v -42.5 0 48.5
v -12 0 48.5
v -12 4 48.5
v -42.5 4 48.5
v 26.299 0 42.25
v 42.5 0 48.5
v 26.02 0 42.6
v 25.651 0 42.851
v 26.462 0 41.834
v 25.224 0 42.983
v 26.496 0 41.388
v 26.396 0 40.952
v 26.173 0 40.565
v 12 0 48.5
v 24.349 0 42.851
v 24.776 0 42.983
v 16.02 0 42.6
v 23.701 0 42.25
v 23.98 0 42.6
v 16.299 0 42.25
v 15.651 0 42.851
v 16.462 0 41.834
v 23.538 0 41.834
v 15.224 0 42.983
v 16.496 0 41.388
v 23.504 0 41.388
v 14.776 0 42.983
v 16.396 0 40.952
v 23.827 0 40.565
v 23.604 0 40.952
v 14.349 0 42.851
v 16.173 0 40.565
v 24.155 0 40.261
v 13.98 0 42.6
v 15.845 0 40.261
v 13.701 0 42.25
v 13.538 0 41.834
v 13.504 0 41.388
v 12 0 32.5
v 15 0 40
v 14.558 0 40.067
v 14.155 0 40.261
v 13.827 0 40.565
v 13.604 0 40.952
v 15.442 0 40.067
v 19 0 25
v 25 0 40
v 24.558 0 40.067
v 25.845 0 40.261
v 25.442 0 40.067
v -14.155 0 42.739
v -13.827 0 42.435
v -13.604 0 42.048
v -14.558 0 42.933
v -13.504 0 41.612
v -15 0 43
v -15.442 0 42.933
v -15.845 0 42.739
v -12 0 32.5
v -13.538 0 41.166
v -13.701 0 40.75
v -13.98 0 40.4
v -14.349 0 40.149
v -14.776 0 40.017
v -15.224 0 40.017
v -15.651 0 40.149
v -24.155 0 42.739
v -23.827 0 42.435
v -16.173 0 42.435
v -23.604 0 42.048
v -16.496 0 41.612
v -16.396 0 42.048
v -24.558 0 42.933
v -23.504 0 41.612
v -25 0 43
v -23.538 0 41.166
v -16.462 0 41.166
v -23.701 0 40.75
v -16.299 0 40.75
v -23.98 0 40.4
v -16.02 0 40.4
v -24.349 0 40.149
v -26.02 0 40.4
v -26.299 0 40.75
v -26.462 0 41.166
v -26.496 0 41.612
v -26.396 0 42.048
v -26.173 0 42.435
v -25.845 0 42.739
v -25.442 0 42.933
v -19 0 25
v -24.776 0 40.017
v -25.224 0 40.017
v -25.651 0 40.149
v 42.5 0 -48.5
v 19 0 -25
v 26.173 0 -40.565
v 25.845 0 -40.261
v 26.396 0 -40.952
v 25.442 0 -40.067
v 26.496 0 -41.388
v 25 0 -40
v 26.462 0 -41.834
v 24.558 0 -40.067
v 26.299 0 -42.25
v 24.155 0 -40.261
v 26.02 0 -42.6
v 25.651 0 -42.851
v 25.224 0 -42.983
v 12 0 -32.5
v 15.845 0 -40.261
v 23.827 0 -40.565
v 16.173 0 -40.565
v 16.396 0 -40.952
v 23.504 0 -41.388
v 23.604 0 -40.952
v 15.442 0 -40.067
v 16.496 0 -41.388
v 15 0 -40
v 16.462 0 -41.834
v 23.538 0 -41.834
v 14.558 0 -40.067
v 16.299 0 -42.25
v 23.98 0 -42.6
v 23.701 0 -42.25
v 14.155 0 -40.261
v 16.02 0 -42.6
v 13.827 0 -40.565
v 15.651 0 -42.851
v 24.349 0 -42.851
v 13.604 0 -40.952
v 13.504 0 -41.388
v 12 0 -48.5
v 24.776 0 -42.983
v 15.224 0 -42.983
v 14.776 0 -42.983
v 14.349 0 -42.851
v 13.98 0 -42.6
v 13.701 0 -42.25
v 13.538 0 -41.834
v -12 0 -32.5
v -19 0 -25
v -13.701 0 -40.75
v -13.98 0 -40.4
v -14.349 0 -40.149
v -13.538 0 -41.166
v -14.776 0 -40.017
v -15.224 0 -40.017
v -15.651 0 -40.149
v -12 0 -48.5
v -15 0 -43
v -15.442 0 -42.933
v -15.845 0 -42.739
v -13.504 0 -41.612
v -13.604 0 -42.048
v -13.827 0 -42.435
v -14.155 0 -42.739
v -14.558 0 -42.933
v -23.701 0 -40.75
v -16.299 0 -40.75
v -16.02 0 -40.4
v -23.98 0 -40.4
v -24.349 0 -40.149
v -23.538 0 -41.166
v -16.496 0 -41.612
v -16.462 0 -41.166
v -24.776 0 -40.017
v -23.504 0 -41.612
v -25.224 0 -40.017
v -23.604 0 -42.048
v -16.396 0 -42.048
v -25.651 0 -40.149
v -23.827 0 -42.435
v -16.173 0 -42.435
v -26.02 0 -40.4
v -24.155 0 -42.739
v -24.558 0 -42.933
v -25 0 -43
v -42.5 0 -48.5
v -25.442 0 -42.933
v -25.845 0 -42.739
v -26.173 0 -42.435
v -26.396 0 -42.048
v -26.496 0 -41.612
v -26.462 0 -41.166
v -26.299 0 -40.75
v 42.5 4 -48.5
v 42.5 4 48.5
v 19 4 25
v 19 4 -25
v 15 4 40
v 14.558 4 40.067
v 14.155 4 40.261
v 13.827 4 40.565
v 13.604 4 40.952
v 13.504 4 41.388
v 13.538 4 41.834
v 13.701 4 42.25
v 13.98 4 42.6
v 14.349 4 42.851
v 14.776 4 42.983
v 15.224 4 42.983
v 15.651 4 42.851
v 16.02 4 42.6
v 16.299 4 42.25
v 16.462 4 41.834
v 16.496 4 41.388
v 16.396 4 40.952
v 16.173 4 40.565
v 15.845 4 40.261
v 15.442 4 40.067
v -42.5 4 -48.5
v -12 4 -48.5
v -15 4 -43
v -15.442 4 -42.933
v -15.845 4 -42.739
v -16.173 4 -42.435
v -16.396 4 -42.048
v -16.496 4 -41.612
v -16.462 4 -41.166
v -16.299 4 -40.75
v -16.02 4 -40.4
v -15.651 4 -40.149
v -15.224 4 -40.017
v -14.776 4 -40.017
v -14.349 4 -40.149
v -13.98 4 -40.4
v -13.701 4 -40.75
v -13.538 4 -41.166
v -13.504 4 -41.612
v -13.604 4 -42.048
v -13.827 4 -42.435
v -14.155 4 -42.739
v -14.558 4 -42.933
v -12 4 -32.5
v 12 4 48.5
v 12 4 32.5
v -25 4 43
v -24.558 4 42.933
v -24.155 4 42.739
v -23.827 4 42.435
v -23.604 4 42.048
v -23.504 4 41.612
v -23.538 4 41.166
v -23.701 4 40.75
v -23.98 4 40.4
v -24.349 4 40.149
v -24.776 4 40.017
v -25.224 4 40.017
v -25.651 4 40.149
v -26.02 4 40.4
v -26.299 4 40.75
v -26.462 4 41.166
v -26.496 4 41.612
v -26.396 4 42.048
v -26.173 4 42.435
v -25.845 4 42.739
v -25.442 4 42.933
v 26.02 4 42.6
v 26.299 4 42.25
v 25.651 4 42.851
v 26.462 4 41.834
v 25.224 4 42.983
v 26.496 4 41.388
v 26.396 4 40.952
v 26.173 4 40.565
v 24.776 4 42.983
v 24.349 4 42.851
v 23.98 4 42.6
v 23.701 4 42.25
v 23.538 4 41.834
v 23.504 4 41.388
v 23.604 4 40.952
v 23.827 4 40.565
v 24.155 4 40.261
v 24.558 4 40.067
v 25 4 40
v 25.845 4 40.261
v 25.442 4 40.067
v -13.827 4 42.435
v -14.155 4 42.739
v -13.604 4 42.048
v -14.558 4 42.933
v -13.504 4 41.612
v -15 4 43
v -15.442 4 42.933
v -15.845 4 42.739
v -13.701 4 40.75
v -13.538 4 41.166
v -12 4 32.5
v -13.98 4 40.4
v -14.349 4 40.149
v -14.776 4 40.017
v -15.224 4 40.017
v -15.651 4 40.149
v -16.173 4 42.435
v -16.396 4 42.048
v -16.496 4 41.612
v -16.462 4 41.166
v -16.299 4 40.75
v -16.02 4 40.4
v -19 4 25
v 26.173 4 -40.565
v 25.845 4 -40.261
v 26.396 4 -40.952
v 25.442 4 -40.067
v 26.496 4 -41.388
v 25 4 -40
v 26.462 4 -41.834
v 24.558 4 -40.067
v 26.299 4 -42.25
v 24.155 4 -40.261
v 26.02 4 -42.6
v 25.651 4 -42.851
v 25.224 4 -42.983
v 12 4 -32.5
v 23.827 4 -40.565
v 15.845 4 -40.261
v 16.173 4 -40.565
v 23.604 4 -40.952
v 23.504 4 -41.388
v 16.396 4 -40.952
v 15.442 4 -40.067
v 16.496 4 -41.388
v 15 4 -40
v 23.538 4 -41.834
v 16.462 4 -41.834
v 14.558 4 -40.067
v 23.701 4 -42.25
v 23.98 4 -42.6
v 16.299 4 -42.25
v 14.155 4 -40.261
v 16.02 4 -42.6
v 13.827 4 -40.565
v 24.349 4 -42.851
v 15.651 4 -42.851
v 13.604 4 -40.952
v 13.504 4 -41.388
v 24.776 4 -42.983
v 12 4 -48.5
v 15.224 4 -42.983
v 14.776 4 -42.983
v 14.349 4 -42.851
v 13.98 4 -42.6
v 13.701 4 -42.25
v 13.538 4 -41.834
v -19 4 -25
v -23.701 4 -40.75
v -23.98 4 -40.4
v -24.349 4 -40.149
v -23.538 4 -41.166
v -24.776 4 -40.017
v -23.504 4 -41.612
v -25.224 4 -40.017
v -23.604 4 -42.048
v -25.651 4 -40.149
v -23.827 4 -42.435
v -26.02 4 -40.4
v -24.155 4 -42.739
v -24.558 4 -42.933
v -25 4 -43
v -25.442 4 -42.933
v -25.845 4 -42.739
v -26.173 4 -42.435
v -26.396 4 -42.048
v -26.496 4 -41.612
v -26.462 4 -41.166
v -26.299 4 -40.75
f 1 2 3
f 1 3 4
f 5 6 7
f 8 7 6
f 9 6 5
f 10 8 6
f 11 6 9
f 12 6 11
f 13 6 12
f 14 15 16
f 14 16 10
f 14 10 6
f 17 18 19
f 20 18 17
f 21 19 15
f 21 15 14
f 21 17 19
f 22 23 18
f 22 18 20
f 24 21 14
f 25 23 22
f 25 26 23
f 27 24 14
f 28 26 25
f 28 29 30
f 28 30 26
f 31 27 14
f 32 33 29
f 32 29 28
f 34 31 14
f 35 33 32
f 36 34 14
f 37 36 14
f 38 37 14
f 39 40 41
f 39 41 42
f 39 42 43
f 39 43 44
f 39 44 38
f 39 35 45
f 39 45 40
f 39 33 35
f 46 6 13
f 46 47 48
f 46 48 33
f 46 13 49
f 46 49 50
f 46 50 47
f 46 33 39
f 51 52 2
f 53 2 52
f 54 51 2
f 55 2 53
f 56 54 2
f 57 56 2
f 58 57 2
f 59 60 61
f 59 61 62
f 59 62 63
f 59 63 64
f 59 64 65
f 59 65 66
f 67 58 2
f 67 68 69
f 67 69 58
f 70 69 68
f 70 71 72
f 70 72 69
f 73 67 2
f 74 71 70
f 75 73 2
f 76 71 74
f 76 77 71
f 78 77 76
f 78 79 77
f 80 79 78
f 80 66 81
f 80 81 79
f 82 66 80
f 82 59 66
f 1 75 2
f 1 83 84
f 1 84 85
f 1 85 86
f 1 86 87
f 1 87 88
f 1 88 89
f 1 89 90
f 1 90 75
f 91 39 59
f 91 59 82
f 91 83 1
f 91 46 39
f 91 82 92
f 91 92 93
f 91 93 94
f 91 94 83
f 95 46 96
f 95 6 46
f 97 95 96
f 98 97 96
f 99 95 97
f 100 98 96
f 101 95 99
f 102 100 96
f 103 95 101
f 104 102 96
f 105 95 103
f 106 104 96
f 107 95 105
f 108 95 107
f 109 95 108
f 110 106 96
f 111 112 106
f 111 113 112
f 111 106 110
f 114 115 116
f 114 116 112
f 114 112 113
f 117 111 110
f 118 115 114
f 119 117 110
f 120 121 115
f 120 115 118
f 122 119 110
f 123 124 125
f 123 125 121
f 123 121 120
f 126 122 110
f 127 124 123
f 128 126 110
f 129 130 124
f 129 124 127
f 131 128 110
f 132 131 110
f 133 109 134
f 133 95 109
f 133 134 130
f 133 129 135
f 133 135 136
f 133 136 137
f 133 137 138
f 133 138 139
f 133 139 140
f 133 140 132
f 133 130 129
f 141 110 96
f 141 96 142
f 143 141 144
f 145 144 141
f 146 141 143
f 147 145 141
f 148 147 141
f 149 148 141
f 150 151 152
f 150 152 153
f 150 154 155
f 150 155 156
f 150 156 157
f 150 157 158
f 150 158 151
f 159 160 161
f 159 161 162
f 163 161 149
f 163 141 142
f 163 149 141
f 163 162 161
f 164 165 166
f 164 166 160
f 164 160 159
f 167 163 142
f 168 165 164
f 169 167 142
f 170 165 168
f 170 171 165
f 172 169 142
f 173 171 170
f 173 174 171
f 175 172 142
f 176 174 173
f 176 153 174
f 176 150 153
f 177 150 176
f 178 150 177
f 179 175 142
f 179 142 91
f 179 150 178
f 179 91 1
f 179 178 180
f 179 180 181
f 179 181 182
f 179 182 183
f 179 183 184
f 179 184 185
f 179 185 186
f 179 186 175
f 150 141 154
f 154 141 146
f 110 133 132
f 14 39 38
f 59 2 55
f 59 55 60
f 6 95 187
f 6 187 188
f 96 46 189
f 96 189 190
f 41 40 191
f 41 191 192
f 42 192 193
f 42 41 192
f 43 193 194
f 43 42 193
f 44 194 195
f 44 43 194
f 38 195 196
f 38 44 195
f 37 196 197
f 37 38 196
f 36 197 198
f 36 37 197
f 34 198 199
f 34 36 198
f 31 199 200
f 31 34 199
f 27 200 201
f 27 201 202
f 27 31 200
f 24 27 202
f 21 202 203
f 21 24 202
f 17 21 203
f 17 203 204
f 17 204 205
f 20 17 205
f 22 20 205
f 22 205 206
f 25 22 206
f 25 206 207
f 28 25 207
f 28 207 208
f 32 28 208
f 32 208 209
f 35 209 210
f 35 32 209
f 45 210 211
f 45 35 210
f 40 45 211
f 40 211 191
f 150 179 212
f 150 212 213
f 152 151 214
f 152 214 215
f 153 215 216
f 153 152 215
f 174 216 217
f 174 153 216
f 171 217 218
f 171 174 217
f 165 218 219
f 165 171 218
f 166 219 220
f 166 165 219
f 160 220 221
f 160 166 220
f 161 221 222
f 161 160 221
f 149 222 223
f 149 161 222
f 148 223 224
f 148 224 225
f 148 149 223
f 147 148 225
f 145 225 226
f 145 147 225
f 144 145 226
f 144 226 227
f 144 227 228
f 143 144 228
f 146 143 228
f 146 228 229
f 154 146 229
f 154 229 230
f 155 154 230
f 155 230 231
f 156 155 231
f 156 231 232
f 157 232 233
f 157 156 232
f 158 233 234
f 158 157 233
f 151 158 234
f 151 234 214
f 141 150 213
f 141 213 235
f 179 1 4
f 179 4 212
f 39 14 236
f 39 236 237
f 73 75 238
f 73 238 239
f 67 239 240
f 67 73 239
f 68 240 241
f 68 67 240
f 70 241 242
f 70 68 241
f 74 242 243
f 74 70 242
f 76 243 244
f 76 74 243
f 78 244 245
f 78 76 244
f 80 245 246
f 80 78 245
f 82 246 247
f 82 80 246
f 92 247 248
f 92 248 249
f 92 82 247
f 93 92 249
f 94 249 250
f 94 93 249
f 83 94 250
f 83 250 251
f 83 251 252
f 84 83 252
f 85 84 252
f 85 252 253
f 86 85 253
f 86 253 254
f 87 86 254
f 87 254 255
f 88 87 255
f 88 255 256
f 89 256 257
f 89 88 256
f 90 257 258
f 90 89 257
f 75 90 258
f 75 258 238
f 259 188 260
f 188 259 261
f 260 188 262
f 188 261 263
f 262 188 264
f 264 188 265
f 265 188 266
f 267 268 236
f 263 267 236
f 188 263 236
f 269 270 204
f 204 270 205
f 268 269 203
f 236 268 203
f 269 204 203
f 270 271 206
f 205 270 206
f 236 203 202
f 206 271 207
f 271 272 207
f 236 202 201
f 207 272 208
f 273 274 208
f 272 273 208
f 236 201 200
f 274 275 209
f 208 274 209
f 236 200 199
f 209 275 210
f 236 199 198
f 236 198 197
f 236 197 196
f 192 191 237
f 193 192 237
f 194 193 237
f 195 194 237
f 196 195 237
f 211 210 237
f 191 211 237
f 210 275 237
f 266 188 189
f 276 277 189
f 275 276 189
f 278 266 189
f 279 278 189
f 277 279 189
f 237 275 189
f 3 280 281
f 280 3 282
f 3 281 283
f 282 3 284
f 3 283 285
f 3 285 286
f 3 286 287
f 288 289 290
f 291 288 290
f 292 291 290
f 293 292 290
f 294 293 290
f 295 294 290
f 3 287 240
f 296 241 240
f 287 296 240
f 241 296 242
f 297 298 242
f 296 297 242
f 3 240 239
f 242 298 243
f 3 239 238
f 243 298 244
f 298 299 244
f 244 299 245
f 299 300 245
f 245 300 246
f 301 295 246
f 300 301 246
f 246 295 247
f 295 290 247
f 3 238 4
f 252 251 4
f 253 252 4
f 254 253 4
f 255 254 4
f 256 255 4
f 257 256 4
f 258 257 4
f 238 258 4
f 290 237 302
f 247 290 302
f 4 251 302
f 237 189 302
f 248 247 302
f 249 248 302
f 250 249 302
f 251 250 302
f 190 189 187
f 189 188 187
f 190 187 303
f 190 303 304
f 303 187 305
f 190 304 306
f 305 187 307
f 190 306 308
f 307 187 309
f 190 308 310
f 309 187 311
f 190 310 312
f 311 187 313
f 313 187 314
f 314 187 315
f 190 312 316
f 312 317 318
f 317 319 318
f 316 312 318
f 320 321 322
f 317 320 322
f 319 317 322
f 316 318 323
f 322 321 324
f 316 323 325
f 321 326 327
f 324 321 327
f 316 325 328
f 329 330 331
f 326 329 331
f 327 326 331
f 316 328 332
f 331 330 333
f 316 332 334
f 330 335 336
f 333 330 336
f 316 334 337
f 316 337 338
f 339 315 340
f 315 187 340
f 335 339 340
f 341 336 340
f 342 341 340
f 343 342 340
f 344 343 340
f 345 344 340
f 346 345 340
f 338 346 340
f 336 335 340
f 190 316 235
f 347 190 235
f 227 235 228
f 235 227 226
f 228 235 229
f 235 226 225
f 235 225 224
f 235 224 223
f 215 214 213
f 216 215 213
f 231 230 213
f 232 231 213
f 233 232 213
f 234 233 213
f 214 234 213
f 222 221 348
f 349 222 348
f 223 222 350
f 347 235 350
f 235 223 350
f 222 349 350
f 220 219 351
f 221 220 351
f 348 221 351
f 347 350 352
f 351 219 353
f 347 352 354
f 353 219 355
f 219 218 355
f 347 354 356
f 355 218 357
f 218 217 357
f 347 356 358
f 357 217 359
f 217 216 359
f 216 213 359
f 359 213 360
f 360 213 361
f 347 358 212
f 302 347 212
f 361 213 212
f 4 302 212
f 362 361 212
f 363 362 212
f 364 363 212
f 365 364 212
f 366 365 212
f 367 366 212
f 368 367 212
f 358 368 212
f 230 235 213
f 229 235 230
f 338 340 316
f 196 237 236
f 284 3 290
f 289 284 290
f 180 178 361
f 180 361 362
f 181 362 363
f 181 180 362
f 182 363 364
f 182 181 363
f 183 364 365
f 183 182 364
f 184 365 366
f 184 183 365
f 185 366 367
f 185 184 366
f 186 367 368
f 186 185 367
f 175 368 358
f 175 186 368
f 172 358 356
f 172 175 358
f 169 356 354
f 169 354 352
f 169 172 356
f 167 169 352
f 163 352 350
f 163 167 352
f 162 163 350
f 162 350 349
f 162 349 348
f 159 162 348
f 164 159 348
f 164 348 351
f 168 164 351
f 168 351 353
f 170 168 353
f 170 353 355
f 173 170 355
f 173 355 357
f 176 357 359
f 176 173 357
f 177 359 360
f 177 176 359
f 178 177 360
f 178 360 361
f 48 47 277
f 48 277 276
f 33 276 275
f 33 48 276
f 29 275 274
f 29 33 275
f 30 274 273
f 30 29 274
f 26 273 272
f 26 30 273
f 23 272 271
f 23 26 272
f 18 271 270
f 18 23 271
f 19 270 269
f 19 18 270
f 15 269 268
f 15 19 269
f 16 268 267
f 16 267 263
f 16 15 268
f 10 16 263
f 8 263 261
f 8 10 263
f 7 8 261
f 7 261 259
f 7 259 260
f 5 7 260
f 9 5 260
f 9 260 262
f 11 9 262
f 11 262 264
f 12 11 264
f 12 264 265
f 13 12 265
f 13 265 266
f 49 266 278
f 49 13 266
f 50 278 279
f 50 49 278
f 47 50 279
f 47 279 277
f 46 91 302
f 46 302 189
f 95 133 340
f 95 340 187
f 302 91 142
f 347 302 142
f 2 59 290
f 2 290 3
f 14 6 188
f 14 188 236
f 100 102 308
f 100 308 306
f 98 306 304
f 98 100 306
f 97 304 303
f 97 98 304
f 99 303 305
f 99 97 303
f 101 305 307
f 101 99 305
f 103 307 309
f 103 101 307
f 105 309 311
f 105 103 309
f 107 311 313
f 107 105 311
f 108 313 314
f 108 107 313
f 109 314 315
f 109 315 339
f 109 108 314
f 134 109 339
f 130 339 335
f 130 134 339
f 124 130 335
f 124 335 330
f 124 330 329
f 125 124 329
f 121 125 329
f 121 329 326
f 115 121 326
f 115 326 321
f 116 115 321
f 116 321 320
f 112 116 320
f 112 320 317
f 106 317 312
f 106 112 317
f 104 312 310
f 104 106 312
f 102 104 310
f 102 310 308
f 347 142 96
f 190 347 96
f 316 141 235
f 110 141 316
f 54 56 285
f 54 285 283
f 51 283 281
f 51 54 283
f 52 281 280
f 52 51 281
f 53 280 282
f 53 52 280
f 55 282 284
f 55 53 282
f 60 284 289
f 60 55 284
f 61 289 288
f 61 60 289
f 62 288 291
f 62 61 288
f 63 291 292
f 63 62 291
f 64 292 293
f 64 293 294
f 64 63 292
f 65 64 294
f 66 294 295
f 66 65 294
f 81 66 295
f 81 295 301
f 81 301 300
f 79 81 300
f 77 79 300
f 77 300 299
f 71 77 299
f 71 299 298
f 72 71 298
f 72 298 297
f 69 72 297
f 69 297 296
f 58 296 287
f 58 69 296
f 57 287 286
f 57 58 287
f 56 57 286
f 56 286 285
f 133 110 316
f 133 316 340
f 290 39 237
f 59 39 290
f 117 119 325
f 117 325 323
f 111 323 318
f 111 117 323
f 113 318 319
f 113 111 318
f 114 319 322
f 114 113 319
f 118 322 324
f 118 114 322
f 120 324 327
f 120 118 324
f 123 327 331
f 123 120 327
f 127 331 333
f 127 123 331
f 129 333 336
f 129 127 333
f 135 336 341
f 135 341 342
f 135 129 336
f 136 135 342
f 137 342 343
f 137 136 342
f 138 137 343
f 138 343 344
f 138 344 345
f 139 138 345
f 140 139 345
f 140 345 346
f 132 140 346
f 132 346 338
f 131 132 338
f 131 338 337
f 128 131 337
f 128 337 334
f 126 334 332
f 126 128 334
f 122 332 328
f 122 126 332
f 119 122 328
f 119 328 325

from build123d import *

# Parameters (mm, degrees)
SKETCH_1_R      = 1.5
SKETCH_1_W      = 38
SKETCH_1_H      = 50
EXTRUDE_1_DEPTH = 4


with BuildPart() as part:
    # 草图1 → 凸台-拉伸1 (new body)
    with BuildSketch(Plane(origin=(0, 0, 0), x_dir=(1, 0, 0), z_dir=(0, 1, 0))):
        Polygon((-12, 48.5), (-12, 32.5), (12, 32.5), (12, 48.5), (42.5, 48.5), (42.5, -48.5), (12, -48.5), (12, -32.5), (-12, -32.5), (-12, -48.5), (-42.5, -48.5), (-42.5, 48.5), align=None)
        with Locations(Location((15, 41.5, 0), (0, 0, 270))):
            Circle(SKETCH_1_R, mode=Mode.SUBTRACT)
        with Locations(Location((25, 41.5, 0), (0, 0, 270))):
            Circle(SKETCH_1_R, mode=Mode.SUBTRACT)
        with Locations(Location((-25, 41.5, 0), (0, 0, 90))):
            Circle(SKETCH_1_R, mode=Mode.SUBTRACT)
        with Locations(Location((-15, 41.5, 0), (0, 0, 90))):
            Circle(SKETCH_1_R, mode=Mode.SUBTRACT)
        with Locations(Location((25, -41.5, 0), (0, 0, 90))):
            Circle(SKETCH_1_R, mode=Mode.SUBTRACT)
        with Locations(Location((15, -41.5, 0), (0, 0, 90))):
            Circle(SKETCH_1_R, mode=Mode.SUBTRACT)
        with Locations(Location((-15, -41.5, 0), (0, 0, 270))):
            Circle(SKETCH_1_R, mode=Mode.SUBTRACT)
        with Locations(Location((-25, -41.5, 0), (0, 0, 270))):
            Circle(SKETCH_1_R, mode=Mode.SUBTRACT)
        Rectangle(SKETCH_1_W, SKETCH_1_H, mode=Mode.SUBTRACT)
    extrude(amount=EXTRUDE_1_DEPTH)


solid = part.part
